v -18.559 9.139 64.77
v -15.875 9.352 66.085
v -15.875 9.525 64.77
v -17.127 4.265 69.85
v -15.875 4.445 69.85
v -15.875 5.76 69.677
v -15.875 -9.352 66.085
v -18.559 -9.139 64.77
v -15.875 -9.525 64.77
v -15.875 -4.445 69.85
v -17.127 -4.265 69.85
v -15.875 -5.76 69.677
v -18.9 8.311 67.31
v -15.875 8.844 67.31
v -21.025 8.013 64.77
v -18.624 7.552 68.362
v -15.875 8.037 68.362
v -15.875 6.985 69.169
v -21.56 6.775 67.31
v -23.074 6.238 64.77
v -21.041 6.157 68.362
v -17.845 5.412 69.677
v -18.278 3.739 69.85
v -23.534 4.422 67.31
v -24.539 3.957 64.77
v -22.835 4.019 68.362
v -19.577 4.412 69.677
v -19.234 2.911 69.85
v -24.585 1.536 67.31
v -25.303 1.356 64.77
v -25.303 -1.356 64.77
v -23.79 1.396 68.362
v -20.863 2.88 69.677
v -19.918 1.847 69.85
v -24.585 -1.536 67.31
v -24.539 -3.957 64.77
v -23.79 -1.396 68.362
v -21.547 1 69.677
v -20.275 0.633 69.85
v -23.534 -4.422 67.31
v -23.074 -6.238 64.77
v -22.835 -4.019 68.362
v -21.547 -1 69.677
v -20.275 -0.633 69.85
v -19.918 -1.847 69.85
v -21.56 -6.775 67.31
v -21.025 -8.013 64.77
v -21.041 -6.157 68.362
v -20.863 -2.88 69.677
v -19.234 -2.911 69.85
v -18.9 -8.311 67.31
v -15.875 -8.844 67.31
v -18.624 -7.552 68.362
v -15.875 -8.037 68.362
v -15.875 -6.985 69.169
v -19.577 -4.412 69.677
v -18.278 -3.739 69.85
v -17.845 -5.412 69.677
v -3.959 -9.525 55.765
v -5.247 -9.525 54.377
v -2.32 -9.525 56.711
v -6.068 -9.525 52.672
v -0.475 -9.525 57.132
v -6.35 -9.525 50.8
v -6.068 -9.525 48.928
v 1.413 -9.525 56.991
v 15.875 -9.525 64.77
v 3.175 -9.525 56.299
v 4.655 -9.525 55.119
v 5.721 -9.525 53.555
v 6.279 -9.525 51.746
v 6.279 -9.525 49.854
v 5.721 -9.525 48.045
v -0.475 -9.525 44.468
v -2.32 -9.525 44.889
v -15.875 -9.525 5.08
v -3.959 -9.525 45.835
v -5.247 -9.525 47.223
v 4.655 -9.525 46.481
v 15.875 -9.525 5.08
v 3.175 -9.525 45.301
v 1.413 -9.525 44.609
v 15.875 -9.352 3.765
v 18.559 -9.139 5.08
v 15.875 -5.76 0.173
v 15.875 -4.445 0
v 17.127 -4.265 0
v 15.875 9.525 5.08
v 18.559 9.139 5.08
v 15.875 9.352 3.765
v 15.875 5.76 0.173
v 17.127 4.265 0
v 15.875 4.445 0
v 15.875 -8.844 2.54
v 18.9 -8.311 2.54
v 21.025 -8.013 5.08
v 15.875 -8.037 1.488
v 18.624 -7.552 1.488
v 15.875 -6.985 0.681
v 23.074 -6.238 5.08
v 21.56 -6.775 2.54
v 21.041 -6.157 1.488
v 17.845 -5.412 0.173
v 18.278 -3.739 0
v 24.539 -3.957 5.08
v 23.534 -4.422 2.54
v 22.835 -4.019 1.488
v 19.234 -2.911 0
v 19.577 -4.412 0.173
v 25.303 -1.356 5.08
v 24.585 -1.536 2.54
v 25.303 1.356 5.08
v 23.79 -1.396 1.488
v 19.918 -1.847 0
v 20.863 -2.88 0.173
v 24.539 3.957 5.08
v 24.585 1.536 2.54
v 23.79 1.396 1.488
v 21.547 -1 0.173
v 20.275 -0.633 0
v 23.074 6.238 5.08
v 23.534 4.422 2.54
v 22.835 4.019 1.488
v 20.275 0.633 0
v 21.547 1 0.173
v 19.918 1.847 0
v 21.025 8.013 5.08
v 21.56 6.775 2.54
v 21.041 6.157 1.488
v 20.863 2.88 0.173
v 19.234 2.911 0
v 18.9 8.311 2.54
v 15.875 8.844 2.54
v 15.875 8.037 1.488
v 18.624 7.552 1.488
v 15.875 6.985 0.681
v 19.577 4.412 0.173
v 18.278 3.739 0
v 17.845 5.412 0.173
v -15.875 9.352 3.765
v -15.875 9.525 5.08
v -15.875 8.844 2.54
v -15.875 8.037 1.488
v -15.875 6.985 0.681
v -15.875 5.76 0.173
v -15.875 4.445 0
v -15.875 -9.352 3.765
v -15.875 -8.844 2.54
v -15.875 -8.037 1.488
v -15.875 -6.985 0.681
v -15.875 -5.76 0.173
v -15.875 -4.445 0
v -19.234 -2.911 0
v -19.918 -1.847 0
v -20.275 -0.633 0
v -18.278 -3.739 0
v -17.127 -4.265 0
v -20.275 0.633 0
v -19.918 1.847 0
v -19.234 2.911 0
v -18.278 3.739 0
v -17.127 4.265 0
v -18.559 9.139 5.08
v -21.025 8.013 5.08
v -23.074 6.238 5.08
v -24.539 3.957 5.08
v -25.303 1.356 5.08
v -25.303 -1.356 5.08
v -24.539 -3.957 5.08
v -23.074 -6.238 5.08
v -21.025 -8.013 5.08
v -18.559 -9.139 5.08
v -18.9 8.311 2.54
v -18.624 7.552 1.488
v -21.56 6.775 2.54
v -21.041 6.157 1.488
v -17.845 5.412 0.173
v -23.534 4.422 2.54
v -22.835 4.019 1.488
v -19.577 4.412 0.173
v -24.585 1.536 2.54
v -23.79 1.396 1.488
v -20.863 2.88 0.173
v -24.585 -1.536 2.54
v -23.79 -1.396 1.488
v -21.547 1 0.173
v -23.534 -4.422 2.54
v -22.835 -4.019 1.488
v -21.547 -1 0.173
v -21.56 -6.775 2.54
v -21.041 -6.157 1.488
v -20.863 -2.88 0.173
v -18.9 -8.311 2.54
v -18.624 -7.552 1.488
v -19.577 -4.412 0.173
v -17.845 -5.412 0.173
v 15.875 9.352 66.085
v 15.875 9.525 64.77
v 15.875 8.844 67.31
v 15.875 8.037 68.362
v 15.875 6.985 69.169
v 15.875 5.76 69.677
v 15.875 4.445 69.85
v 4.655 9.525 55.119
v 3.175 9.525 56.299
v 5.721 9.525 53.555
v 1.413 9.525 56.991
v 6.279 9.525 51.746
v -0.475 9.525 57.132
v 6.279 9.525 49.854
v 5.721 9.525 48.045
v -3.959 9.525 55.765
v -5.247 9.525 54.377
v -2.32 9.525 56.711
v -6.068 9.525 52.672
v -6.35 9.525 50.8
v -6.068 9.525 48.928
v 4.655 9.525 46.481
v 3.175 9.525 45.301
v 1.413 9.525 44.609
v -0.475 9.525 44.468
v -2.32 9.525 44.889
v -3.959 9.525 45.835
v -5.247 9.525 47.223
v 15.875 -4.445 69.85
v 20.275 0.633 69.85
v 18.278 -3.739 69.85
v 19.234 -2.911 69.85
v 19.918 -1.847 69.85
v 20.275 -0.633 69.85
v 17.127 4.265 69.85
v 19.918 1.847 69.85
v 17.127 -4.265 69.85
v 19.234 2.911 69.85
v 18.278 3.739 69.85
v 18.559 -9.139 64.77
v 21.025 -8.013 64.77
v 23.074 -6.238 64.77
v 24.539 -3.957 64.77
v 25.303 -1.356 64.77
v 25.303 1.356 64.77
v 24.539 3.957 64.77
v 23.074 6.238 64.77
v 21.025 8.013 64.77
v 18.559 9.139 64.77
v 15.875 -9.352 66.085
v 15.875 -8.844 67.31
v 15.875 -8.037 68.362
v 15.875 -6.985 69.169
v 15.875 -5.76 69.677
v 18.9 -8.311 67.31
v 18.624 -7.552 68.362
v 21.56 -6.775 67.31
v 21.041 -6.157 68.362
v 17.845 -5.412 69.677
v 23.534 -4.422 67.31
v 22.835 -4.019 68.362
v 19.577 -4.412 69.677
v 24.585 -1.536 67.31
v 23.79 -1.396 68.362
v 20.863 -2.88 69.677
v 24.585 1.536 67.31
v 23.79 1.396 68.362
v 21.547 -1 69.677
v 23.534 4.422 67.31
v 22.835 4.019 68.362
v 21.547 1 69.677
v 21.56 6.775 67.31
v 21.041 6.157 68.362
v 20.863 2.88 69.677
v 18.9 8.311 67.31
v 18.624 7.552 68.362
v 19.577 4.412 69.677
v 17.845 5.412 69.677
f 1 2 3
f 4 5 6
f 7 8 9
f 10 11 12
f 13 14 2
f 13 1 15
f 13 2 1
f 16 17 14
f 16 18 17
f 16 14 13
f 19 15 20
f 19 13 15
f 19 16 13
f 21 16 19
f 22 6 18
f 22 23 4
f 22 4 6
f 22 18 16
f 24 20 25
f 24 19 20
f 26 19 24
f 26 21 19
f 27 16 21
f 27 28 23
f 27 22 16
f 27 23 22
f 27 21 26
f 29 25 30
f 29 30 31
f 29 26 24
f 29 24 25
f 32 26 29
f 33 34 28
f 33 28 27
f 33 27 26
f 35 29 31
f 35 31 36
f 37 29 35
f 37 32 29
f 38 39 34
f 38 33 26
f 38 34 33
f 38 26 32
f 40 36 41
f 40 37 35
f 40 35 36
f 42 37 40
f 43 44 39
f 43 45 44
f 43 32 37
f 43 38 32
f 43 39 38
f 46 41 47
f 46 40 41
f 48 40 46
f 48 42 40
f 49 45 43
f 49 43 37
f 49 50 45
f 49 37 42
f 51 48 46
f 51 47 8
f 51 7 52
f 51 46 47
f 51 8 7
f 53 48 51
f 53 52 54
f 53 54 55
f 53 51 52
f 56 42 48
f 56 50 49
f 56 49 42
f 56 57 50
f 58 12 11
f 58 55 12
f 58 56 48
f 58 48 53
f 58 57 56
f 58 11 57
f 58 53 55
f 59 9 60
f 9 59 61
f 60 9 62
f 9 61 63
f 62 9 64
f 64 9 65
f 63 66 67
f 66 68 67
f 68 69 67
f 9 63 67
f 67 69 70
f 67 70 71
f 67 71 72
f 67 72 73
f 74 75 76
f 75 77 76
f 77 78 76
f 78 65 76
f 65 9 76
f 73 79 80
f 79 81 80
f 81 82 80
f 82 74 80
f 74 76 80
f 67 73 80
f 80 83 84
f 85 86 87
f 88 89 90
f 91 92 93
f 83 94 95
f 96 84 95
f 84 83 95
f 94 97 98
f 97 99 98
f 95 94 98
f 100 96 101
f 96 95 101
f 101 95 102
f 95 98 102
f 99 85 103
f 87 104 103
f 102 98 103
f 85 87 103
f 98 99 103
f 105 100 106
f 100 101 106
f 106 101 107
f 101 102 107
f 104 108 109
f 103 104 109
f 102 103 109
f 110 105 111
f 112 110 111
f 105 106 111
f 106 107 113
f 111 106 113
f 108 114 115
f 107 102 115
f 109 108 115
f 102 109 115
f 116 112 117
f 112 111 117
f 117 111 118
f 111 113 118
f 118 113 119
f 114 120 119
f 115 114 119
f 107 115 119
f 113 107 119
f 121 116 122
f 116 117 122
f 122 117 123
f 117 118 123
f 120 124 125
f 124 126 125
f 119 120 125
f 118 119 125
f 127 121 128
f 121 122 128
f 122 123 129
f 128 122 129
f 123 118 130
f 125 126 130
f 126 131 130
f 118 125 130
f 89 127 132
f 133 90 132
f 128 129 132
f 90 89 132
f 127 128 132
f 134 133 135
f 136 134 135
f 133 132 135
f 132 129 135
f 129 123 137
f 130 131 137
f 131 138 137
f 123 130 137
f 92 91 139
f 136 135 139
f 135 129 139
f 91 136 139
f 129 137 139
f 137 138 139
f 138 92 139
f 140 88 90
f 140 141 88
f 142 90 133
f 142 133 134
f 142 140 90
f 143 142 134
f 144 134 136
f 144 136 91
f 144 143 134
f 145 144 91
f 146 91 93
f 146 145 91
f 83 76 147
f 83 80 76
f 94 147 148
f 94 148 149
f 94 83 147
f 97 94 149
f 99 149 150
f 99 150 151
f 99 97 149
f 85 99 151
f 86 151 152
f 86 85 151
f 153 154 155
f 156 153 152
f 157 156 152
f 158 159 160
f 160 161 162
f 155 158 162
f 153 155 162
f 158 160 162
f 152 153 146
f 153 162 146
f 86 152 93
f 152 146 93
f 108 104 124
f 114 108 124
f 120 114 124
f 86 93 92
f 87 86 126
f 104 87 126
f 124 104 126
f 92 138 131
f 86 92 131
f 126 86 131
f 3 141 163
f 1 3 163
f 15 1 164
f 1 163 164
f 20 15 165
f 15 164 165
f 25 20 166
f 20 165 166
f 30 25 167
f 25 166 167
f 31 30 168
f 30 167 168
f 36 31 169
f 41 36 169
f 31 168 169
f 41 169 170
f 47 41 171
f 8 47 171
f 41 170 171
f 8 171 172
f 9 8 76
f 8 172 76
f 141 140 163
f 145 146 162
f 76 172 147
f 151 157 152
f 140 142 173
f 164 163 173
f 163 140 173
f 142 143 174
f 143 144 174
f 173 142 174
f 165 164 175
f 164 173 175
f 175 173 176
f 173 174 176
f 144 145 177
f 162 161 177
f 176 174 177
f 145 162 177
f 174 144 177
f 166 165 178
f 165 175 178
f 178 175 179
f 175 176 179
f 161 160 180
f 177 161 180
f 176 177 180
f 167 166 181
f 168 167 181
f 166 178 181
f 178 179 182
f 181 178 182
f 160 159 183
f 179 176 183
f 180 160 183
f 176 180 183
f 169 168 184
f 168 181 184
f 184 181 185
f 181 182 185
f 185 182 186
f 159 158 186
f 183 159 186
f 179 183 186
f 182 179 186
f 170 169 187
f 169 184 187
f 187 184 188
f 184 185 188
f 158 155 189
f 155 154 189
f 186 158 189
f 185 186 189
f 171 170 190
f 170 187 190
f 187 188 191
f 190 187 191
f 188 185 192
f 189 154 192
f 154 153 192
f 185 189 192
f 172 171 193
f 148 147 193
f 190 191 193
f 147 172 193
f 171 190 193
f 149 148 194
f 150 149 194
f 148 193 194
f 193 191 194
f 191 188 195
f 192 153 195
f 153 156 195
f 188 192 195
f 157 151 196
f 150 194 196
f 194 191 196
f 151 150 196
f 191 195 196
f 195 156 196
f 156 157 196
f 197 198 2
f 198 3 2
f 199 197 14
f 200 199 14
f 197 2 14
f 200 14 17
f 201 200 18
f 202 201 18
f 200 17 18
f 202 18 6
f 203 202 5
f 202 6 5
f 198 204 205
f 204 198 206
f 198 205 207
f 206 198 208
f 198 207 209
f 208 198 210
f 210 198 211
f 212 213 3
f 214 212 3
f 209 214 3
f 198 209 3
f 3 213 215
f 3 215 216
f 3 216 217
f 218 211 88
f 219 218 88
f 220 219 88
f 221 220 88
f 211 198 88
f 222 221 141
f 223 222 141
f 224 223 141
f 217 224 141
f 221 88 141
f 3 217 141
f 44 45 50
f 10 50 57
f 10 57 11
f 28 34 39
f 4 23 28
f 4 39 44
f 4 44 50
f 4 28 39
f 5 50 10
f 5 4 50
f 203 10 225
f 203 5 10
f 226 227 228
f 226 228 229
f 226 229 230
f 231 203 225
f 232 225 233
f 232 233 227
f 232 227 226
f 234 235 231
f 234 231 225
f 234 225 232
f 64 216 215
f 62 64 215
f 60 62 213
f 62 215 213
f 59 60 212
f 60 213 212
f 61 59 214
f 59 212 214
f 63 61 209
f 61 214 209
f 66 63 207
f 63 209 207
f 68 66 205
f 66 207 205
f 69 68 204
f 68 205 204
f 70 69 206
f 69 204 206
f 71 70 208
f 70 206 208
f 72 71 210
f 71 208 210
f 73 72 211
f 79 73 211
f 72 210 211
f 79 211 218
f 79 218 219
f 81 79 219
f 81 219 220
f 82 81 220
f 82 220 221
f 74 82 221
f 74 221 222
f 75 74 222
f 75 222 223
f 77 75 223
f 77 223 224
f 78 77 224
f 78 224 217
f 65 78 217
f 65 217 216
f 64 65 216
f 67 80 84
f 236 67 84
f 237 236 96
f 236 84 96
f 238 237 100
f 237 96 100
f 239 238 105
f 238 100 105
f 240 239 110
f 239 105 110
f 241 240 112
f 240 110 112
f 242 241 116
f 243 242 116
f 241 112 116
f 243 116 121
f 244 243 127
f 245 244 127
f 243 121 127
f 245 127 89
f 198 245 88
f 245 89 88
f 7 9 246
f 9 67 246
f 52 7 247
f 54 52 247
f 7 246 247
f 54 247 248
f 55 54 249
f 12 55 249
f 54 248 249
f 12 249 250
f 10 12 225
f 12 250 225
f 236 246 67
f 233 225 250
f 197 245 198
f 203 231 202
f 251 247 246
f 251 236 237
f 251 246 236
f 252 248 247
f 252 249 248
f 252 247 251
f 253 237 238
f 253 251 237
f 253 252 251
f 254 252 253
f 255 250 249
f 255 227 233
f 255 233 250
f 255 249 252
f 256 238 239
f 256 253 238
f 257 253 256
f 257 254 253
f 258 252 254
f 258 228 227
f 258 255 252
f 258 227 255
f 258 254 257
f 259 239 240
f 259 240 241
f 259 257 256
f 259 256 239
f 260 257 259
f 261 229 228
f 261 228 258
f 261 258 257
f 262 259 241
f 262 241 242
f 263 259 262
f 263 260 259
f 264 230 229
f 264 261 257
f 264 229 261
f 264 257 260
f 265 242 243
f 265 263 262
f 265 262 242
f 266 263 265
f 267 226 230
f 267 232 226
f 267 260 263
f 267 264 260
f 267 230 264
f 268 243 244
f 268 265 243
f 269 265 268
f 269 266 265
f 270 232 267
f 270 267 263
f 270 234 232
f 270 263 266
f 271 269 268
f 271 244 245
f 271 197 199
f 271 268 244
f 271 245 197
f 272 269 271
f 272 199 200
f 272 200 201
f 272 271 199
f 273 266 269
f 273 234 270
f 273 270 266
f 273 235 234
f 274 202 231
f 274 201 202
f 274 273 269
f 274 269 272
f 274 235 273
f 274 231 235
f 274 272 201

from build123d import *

# Parameters (mm, degrees)
F1_DEPTH = 69.85
F2_R     = 5.08
F3_R     = 6.35
F4_DEPTH = 19.051


with BuildPart() as f1:
    # F0 (on Top) → F1 (new body)
    with BuildSketch(Plane.XY):
        with BuildLine():
            Line((15.875, 9.525), (-15.875, 9.525))
            ThreePointArc((-15.875, 9.525), (-25.4, 0), (-15.875, -9.525))
            Line((-15.875, -9.525), (15.875, -9.525))
            ThreePointArc((15.875, -9.525), (25.4, 0), (15.875, 9.525))
        make_face()
    extrude(amount=F1_DEPTH)

    # F2
    f2_edges = [f1.edges().sort_by_distance(p)[0] for p in [
        (0, -9.525, 69.85),
        (25.4, 0, 69.85),
        (0, 9.525, 69.85),
        (-25.4, 0, 69.85),
        (0, -9.525, 0),
        (25.4, 0, 0),
        (0, 9.525, 0),
        (-25.4, 0, 0),
    ]]
    fillet(f2_edges, radius=F2_R)

    # F3 (on face) → F4 (cut, through all)
    with BuildSketch(Plane(origin=(0, 9.525, 0), x_dir=(-1, 0, 0), z_dir=(0, 1, 0))):
        with Locations((0, 50.8)):
            Circle(F3_R)
    extrude(amount=-F4_DEPTH, mode=Mode.SUBTRACT)


solid = f1.part
